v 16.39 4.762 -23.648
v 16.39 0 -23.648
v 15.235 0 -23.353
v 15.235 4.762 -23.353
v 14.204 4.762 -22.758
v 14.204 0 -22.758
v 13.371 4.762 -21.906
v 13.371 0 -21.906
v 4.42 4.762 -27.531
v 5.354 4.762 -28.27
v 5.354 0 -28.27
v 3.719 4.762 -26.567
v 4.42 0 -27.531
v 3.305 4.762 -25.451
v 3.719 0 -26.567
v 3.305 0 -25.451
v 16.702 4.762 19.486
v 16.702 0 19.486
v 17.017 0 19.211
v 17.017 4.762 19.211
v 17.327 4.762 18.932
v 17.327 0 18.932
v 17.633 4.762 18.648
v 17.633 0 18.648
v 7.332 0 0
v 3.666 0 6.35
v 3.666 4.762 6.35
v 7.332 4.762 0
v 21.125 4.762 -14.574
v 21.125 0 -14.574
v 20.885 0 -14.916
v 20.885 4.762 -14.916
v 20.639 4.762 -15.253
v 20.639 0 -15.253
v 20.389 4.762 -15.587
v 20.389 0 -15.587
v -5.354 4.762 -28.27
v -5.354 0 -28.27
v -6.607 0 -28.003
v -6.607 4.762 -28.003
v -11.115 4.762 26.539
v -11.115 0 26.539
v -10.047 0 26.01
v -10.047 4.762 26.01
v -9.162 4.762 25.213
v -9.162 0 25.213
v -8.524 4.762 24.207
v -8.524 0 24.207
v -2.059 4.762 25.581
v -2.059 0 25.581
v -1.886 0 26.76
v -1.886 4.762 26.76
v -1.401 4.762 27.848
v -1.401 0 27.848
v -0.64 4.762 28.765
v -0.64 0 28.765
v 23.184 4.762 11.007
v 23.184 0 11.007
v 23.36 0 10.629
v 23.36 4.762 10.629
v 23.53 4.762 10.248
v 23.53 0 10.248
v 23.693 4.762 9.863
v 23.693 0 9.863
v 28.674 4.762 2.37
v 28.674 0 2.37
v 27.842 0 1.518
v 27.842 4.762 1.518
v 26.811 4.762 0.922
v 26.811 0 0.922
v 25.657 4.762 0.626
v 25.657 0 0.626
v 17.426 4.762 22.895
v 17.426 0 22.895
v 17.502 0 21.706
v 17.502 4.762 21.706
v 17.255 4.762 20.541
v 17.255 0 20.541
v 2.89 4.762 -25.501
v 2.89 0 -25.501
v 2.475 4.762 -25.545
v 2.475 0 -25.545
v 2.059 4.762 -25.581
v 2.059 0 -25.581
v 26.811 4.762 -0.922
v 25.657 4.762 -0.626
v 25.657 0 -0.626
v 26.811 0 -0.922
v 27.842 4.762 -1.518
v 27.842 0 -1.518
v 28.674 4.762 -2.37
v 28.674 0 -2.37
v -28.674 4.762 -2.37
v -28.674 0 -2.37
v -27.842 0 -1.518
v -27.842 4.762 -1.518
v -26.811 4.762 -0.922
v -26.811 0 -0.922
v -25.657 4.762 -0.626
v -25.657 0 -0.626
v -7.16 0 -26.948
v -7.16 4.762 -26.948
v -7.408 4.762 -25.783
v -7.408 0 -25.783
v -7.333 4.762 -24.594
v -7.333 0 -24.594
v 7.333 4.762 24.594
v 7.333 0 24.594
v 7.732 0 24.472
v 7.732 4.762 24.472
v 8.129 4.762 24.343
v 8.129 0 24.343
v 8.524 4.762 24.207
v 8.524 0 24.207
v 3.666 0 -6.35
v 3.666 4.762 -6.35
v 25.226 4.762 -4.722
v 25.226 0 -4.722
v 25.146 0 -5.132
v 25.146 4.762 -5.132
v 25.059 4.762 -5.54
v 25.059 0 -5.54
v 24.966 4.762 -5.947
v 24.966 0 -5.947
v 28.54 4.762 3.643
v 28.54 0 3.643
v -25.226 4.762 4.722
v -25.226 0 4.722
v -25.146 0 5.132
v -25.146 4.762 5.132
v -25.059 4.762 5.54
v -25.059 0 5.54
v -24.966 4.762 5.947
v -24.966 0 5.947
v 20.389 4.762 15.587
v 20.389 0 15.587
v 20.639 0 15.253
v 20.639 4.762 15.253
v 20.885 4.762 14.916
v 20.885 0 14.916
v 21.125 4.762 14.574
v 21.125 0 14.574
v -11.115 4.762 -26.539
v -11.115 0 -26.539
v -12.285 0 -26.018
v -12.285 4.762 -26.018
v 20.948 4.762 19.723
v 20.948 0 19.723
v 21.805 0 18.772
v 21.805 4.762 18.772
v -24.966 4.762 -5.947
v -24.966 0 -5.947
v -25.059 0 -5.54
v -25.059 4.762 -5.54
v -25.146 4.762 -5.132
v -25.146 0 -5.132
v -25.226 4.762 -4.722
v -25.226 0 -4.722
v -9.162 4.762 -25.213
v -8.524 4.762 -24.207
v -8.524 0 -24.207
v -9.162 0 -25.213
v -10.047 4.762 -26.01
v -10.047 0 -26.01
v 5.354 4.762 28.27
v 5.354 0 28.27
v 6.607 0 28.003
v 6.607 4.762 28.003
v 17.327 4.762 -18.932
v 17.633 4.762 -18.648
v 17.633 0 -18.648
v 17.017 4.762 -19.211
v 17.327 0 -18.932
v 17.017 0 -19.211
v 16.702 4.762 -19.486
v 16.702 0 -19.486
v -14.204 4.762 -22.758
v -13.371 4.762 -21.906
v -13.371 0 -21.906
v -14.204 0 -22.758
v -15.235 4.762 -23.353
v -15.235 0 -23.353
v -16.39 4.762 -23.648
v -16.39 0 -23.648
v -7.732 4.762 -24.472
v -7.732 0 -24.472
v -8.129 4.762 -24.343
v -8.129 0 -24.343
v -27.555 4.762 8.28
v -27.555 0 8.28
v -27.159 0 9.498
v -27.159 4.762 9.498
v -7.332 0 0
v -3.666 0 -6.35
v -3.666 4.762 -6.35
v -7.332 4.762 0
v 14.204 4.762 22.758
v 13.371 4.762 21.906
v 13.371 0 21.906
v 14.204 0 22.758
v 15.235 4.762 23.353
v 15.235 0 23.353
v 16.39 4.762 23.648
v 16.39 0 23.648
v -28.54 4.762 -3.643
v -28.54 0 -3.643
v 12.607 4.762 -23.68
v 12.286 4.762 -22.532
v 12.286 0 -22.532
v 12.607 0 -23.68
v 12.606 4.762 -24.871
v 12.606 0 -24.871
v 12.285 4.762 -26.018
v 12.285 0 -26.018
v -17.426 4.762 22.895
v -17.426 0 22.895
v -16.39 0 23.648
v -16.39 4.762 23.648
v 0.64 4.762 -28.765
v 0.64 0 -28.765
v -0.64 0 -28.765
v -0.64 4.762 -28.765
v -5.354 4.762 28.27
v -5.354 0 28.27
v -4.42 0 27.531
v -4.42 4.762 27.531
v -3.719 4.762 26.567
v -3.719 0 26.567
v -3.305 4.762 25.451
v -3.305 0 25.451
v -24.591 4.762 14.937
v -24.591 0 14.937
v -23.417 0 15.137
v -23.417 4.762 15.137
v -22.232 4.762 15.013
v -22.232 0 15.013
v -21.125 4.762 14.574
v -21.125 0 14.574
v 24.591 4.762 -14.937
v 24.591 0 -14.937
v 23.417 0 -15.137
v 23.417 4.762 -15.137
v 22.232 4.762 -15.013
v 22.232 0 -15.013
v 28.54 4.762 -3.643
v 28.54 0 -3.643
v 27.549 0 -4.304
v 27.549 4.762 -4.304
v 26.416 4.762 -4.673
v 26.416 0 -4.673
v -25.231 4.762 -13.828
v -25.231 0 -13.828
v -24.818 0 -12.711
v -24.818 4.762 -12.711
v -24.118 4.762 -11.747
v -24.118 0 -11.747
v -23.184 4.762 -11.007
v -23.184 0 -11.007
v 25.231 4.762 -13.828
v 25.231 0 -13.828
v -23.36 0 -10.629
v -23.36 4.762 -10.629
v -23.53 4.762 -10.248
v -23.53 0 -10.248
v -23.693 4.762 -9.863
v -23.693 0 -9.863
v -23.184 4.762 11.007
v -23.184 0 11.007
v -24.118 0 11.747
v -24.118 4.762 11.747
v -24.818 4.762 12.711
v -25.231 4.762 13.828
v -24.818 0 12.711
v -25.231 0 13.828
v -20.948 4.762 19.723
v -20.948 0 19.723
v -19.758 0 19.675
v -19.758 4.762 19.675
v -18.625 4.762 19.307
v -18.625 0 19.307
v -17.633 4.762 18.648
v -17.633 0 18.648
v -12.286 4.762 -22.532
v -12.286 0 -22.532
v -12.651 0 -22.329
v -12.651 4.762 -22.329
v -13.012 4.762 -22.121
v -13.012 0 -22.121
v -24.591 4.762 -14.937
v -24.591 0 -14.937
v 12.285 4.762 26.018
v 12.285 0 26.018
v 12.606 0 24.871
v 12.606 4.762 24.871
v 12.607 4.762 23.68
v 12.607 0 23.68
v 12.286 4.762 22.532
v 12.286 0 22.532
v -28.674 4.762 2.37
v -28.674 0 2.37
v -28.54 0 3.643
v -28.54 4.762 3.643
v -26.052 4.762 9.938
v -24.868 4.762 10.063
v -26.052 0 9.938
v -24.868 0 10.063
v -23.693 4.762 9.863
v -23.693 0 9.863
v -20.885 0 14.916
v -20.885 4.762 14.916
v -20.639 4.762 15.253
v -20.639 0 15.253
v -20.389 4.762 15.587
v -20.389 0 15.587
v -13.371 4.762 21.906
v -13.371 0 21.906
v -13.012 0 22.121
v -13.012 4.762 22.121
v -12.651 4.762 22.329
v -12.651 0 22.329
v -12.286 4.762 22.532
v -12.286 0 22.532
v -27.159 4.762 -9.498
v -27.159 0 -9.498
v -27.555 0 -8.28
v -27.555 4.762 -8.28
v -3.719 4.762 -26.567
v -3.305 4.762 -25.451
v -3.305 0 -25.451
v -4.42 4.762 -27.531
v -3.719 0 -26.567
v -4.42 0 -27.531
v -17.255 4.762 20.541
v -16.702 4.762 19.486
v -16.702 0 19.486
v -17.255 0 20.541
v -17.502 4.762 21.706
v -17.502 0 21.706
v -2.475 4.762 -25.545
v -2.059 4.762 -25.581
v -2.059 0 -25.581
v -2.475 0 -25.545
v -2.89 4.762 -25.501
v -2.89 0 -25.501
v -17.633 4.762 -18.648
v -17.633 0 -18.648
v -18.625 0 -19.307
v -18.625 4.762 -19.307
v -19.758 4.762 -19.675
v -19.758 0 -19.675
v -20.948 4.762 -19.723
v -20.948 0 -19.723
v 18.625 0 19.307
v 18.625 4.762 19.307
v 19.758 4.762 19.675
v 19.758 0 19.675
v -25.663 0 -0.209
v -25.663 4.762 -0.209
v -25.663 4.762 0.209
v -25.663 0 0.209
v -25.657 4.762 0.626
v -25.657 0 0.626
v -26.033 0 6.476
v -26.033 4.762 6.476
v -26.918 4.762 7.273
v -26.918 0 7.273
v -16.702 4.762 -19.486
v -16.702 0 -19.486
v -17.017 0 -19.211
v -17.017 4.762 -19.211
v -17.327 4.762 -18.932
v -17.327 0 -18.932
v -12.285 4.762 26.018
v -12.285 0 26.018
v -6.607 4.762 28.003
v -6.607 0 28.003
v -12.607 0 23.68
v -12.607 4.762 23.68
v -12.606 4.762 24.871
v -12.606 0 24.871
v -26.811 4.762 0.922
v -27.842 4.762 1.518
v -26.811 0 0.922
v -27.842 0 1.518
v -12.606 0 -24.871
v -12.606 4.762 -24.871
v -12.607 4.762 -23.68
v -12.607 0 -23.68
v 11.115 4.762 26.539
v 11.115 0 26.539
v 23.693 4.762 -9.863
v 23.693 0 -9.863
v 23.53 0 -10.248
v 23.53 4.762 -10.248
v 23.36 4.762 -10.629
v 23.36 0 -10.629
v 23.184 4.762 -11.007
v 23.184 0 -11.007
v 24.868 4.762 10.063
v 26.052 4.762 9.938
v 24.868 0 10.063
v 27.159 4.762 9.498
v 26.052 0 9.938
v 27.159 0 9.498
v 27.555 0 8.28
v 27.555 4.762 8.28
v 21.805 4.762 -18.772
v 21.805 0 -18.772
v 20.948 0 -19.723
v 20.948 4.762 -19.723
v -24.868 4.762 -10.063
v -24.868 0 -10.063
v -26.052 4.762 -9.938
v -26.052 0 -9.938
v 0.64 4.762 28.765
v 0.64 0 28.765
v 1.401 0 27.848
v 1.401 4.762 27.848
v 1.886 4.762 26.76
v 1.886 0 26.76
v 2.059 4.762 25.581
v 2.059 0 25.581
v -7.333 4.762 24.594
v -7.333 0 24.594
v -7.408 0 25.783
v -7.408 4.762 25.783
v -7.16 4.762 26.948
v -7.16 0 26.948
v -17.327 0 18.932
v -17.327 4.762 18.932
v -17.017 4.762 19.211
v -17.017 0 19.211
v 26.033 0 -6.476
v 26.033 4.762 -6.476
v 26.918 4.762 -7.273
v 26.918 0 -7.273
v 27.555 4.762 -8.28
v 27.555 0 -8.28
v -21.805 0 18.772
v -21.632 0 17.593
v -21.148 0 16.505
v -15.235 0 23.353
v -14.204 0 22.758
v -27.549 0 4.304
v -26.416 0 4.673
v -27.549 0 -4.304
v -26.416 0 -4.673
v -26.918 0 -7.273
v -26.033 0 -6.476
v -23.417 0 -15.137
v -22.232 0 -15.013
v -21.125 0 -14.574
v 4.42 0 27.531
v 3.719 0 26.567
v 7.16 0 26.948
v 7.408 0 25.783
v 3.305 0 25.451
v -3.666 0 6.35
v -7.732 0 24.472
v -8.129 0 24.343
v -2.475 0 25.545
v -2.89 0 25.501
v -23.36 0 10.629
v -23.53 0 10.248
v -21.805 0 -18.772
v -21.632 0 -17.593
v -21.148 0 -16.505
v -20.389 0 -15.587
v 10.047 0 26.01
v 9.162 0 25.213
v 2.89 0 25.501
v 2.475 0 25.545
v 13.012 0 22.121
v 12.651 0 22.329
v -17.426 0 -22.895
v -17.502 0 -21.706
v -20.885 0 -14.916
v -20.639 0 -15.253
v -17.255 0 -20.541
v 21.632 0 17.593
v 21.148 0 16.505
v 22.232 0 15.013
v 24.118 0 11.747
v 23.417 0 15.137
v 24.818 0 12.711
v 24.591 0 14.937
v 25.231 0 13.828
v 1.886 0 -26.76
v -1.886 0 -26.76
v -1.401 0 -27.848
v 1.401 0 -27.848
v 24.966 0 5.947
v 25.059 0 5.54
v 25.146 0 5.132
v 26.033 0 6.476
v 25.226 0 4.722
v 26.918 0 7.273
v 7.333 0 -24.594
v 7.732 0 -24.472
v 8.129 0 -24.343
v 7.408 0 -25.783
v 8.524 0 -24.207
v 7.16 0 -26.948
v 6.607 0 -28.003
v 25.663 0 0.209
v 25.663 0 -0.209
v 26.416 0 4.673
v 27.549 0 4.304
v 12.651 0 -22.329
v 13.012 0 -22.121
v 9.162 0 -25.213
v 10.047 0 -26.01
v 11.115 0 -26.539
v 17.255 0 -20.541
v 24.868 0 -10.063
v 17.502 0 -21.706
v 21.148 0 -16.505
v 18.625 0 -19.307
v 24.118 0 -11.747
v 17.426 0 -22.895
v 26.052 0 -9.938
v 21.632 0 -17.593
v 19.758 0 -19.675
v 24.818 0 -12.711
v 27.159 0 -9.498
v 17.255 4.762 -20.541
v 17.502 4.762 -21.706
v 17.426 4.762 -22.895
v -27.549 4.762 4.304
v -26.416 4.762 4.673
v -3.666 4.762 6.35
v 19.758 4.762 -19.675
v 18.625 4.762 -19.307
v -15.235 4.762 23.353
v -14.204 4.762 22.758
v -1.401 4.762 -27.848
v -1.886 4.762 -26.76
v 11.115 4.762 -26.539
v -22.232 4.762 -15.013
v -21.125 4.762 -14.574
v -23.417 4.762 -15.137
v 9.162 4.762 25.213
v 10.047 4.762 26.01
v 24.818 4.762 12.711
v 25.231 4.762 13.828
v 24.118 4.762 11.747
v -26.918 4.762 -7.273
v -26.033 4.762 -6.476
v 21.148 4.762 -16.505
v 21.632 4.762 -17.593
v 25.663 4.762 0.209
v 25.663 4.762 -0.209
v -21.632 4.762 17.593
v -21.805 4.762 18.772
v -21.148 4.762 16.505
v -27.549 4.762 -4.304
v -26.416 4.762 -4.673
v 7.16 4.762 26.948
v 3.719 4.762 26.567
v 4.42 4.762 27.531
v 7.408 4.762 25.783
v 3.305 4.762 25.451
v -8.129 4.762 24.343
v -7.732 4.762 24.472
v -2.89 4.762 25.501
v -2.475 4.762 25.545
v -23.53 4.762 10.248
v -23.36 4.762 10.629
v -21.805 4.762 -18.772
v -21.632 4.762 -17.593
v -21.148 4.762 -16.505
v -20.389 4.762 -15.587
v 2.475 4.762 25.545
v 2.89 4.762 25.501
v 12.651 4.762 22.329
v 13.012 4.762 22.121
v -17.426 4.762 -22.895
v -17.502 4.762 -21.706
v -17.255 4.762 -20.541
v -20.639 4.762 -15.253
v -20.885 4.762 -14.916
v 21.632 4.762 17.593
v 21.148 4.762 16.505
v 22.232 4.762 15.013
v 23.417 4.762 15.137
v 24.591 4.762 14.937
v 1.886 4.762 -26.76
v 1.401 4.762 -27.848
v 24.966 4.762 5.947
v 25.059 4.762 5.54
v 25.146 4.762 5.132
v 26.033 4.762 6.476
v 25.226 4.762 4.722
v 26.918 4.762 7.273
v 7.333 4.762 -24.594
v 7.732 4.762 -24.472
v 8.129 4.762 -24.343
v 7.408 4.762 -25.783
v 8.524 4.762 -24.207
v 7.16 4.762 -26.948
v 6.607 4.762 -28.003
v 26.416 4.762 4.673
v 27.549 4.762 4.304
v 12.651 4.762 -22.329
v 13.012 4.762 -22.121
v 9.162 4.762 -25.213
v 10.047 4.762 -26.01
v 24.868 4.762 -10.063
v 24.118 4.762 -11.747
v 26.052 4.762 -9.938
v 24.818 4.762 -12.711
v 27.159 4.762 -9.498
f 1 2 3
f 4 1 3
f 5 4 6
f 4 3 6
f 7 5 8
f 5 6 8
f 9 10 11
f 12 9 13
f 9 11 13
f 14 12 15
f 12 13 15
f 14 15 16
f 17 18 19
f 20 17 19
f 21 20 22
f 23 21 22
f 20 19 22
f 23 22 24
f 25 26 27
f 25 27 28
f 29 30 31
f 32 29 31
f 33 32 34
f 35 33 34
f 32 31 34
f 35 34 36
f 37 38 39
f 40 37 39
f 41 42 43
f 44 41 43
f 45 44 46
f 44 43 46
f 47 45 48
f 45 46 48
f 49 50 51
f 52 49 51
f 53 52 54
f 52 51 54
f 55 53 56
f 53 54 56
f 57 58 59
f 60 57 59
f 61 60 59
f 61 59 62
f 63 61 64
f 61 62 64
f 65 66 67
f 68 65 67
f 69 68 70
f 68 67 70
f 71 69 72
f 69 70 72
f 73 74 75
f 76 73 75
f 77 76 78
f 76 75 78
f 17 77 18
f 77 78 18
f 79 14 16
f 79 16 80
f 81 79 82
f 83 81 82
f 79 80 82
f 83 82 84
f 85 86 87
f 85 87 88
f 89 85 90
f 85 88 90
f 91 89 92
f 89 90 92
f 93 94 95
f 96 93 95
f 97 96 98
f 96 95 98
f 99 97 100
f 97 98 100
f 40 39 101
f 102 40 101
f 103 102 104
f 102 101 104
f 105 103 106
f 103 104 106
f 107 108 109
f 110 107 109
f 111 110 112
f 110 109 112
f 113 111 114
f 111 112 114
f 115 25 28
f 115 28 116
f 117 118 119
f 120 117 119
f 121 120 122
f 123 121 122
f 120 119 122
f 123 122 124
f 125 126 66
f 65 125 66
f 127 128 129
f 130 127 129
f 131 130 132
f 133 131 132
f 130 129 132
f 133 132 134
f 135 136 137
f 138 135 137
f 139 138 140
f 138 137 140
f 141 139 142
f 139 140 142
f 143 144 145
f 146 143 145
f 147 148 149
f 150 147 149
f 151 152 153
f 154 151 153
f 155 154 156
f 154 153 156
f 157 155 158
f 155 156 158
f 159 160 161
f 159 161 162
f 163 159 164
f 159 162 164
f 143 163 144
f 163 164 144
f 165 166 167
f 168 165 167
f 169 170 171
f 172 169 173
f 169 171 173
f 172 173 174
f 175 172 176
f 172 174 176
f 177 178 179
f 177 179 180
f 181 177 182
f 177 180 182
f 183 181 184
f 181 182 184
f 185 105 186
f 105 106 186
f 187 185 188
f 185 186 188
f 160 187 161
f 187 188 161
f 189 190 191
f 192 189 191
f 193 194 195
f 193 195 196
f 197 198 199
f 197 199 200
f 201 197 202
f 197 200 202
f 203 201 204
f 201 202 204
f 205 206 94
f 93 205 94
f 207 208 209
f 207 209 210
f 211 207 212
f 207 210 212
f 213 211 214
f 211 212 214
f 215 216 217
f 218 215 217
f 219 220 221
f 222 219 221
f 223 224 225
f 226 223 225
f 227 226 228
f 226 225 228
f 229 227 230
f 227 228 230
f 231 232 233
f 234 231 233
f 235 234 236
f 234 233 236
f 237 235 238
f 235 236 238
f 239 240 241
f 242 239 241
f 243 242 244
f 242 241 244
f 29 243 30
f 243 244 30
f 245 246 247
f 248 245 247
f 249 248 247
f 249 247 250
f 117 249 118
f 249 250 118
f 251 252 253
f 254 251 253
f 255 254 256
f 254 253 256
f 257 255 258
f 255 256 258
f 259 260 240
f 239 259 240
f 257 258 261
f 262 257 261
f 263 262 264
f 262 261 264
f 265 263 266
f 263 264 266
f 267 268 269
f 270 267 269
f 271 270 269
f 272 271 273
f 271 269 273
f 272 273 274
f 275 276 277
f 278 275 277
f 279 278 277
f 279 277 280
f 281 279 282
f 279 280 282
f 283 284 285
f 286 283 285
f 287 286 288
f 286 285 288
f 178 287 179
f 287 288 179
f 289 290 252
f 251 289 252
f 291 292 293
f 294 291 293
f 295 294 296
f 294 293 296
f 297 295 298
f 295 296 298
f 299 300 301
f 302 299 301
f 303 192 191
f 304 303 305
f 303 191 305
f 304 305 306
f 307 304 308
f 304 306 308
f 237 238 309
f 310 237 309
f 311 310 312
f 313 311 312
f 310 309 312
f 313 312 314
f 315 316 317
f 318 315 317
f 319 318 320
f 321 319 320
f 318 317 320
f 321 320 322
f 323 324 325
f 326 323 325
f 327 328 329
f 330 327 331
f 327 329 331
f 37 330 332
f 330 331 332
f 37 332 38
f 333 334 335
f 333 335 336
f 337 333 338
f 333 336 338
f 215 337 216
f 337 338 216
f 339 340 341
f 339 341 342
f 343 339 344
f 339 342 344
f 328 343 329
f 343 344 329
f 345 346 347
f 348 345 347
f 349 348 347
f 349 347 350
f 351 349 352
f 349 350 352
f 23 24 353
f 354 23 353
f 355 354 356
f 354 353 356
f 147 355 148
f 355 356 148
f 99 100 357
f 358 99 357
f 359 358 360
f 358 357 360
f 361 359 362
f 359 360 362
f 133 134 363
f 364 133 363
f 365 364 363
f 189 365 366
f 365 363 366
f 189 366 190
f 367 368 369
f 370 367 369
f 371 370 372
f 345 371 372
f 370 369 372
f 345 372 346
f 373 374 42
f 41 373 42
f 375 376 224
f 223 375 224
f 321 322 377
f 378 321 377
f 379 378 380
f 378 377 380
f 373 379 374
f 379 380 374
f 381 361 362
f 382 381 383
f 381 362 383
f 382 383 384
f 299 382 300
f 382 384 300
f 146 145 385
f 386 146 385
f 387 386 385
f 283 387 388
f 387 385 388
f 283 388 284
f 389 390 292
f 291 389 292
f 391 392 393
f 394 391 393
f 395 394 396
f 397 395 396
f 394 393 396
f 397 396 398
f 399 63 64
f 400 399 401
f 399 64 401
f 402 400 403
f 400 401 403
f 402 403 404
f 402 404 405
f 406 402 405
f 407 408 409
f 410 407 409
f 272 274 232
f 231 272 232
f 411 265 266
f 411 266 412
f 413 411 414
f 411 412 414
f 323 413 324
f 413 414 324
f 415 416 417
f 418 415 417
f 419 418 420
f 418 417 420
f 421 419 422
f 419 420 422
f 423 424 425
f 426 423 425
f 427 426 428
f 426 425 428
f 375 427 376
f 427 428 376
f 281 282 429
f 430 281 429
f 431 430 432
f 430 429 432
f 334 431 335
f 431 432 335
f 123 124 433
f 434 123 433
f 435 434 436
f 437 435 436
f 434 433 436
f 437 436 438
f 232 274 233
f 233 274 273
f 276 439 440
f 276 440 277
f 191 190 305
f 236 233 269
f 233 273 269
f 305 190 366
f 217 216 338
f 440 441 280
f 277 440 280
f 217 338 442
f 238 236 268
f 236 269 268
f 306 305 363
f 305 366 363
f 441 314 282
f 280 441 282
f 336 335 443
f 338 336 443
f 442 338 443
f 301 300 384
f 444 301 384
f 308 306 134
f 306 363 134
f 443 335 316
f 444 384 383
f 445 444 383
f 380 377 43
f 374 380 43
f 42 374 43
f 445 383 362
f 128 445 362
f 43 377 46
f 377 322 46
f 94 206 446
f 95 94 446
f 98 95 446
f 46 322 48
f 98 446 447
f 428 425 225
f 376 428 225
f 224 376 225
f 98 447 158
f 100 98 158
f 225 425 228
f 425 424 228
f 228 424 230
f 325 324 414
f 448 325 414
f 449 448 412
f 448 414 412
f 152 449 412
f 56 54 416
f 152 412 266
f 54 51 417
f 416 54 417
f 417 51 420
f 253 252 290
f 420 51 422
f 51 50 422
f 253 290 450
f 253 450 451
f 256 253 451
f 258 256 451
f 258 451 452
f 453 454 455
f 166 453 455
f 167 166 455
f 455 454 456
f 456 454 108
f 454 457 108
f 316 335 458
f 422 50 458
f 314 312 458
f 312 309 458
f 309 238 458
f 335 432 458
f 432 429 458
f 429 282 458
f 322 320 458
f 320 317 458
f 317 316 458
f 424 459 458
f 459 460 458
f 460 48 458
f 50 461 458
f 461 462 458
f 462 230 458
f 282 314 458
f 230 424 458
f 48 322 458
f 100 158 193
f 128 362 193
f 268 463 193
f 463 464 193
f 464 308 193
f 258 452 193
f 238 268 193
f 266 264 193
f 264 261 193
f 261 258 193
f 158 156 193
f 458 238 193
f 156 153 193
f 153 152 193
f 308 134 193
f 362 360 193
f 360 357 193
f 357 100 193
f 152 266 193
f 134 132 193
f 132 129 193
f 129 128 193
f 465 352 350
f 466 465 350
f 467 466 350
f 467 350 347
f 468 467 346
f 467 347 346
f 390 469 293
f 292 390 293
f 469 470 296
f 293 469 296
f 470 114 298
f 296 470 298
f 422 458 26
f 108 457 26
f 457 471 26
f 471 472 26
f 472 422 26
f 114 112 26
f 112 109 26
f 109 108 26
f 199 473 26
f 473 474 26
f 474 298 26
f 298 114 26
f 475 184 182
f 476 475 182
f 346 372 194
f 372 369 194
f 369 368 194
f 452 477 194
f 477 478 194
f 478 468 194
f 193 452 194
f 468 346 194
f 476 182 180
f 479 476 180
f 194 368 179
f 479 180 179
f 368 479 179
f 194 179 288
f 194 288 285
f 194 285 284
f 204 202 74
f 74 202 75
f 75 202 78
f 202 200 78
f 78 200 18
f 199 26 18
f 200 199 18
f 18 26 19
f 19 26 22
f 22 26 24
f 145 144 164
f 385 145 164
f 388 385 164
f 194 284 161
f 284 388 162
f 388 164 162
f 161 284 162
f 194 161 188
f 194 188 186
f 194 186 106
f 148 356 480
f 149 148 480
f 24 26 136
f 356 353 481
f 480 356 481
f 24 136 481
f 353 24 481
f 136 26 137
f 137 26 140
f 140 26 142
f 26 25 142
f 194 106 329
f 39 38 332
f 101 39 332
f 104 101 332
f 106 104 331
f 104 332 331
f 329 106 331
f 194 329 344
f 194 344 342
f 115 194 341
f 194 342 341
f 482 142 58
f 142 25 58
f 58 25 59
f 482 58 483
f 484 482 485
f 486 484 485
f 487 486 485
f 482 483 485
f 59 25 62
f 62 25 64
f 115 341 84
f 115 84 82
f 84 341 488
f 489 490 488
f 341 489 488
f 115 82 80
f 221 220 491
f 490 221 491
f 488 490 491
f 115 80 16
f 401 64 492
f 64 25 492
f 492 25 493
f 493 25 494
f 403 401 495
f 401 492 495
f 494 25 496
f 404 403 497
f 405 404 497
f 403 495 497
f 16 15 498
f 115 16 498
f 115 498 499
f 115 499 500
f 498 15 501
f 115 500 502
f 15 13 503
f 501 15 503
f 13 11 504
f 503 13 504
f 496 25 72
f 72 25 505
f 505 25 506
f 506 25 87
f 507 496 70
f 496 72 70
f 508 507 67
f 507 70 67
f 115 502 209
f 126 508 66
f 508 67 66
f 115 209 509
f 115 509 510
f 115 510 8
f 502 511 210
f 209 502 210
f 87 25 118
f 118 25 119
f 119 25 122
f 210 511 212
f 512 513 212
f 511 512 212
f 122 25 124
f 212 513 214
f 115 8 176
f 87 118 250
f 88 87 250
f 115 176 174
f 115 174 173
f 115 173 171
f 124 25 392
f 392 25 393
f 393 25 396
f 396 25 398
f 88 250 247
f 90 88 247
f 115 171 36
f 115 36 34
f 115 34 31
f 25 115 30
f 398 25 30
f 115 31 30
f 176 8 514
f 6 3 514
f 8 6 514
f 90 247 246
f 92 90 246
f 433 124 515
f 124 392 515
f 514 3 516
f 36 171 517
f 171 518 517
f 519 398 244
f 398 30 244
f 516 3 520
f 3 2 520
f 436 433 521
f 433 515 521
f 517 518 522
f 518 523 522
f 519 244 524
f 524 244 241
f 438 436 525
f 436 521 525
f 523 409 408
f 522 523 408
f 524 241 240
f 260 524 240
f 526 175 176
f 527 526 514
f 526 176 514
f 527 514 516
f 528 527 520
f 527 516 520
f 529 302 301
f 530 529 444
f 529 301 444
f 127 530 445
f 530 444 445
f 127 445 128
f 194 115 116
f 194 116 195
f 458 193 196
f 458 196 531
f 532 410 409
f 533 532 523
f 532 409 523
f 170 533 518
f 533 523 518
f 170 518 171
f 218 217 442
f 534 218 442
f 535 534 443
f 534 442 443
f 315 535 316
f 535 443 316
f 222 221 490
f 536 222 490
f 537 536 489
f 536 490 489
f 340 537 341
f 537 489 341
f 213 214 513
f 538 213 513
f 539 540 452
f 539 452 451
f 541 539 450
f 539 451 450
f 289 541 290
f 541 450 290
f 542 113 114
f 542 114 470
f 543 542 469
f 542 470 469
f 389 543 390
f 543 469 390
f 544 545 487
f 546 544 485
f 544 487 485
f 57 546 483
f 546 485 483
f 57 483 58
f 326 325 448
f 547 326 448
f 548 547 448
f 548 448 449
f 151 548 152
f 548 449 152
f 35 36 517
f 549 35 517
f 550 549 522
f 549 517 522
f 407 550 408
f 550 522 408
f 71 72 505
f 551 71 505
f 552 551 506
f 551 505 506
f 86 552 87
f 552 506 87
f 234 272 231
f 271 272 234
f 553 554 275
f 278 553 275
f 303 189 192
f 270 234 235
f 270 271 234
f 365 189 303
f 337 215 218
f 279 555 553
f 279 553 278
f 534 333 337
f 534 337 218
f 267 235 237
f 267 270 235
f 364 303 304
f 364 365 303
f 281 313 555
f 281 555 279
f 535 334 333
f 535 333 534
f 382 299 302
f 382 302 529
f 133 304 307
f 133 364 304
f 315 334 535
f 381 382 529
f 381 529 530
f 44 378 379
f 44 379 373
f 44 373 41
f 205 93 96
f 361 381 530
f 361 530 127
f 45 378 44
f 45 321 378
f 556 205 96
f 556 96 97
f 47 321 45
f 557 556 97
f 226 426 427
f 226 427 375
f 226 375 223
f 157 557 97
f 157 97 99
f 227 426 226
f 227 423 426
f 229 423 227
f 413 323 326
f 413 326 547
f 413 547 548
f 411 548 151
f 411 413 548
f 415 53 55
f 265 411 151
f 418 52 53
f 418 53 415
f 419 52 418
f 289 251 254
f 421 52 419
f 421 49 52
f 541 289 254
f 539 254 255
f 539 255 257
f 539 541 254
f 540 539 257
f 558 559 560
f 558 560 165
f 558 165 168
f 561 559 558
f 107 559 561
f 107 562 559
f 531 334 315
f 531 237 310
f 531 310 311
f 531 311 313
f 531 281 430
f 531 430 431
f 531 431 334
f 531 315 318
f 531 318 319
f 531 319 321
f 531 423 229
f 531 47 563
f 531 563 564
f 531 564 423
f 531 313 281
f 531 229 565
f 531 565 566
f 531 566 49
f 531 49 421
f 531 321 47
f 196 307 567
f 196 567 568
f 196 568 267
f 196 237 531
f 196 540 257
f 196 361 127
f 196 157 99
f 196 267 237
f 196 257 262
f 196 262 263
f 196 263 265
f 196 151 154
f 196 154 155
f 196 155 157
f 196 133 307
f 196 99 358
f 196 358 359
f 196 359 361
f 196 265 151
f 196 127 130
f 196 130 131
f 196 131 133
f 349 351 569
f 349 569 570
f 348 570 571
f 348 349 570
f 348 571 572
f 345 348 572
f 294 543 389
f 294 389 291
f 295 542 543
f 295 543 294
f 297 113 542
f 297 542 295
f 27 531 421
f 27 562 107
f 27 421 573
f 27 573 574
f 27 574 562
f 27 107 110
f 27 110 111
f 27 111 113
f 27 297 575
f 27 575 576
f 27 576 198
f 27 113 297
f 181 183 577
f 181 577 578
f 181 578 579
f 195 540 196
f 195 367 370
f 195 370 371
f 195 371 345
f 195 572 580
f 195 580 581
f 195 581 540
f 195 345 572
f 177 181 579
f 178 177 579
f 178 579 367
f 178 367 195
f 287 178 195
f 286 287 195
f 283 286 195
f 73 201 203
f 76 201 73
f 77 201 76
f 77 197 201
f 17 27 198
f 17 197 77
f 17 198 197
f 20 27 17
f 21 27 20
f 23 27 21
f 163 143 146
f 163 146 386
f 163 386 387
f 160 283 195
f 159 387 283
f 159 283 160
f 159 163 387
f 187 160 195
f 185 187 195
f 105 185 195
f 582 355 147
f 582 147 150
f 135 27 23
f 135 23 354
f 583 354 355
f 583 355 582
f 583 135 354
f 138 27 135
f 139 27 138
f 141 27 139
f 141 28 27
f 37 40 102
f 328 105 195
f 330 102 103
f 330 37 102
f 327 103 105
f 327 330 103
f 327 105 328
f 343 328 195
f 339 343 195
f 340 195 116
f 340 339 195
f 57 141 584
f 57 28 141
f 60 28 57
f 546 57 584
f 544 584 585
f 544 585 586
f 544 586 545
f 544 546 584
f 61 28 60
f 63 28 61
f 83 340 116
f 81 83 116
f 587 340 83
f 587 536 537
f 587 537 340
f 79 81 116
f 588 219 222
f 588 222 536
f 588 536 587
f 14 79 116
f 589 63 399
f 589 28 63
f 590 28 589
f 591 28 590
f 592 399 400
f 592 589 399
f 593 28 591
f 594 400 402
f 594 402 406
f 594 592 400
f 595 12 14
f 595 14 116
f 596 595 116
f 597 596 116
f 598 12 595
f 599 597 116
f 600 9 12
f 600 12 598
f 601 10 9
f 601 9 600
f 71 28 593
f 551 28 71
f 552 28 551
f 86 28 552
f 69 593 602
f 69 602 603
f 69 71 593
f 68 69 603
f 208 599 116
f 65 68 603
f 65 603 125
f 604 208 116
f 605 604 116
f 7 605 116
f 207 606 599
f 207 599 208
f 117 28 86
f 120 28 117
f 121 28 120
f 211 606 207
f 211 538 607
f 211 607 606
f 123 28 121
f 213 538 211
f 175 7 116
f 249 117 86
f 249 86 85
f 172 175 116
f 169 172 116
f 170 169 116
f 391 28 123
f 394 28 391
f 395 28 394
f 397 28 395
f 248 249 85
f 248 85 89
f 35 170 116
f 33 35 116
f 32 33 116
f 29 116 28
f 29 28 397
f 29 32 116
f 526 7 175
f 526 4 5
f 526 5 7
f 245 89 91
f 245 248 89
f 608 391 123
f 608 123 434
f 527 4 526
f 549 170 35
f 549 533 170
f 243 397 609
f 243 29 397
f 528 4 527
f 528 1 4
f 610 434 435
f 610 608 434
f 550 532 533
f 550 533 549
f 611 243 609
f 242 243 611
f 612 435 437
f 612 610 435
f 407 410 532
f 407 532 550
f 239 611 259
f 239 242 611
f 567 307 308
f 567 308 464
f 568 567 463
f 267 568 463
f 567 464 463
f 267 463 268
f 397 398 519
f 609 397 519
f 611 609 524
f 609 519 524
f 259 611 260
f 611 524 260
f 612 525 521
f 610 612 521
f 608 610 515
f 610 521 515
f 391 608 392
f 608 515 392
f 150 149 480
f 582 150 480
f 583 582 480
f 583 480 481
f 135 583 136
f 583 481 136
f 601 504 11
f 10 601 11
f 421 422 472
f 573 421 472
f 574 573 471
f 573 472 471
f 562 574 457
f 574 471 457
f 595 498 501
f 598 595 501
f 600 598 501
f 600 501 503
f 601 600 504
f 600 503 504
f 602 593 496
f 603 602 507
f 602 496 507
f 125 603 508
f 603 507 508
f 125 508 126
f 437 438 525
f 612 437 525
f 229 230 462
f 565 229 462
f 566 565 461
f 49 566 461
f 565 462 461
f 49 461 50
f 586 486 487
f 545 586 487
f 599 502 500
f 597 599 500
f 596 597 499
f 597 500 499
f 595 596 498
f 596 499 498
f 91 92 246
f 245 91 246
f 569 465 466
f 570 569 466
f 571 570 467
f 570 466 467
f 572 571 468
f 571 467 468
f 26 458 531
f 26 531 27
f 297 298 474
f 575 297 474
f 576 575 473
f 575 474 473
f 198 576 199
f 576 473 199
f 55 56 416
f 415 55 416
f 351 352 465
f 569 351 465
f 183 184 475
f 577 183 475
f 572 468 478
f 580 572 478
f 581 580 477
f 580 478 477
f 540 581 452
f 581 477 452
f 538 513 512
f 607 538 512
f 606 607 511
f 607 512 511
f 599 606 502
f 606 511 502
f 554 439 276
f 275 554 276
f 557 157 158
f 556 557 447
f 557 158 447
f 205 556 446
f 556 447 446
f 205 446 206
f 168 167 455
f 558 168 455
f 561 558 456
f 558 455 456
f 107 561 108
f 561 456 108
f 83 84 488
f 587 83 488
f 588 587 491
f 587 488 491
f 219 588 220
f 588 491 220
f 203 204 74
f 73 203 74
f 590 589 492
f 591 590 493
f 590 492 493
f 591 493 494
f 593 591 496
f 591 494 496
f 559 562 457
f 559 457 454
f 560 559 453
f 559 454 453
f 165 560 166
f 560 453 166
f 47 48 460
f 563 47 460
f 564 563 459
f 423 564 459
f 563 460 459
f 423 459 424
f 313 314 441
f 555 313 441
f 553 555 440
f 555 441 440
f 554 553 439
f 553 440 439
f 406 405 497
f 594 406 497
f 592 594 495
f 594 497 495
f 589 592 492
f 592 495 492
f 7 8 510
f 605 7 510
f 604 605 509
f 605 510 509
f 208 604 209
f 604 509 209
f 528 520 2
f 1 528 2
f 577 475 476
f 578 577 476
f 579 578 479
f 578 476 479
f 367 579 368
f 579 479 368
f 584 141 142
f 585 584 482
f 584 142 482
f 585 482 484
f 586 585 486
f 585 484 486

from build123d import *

# Parameters (mm, degrees)
SKETCH2_R           = 25.664173075
BOSS_EXTRUDE2_DEPTH = 4.7625
BOSS_EXTRUDE3_DEPTH = 4.7625
CIRPATTERN1_COUNT   = 30


with BuildPart() as part:
    # Sketch2 → Boss-Extrude2 (new body)
    with BuildSketch(Plane(origin=(0, 0, 0), x_dir=(1, 0, 0), z_dir=(0, 1, 0))):
        Circle(SKETCH2_R)
        Polygon((7.332348419, 0), (3.666174209, 6.35), (-3.666174209, 6.35), (-7.332348419, 0), (-3.666174209, -6.35), (3.666174209, -6.35), align=None, mode=Mode.SUBTRACT)
    extrude(amount=BOSS_EXTRUDE2_DEPTH)

    # Sketch1 → Boss-Extrude3 (add)
    with BuildSketch(Plane(origin=(0, 0, 0), x_dir=(1, 0, 0), z_dir=(0, 1, 0))):
        with BuildLine():
            Line((0.640211275, 28.764979636), (-0.640211275, 28.764979636))
            ThreePointArc((-0.640211275, 28.764979636), (-1.726312193, 27.213866774), (-2.055125292, 25.349075026))
            ThreePointArc((-2.055125292, 25.349075026), (0, 25.432246157), (2.055125292, 25.349075026))
            ThreePointArc((2.055125292, 25.349075026), (1.726312193, 27.213866774), (0.640211275, 28.764979636))
        make_face()
    boss_extrude3 = extrude(amount=BOSS_EXTRUDE3_DEPTH)

    # CirPattern1: Boss-Extrude3 ×30 about axis
    cirpattern1_axis = Axis((0, 0, 0), (0, 1, 0))
    for i in range(1, CIRPATTERN1_COUNT):
        add(boss_extrude3.rotate(cirpattern1_axis, i * 360 / CIRPATTERN1_COUNT))


solid = part.part
